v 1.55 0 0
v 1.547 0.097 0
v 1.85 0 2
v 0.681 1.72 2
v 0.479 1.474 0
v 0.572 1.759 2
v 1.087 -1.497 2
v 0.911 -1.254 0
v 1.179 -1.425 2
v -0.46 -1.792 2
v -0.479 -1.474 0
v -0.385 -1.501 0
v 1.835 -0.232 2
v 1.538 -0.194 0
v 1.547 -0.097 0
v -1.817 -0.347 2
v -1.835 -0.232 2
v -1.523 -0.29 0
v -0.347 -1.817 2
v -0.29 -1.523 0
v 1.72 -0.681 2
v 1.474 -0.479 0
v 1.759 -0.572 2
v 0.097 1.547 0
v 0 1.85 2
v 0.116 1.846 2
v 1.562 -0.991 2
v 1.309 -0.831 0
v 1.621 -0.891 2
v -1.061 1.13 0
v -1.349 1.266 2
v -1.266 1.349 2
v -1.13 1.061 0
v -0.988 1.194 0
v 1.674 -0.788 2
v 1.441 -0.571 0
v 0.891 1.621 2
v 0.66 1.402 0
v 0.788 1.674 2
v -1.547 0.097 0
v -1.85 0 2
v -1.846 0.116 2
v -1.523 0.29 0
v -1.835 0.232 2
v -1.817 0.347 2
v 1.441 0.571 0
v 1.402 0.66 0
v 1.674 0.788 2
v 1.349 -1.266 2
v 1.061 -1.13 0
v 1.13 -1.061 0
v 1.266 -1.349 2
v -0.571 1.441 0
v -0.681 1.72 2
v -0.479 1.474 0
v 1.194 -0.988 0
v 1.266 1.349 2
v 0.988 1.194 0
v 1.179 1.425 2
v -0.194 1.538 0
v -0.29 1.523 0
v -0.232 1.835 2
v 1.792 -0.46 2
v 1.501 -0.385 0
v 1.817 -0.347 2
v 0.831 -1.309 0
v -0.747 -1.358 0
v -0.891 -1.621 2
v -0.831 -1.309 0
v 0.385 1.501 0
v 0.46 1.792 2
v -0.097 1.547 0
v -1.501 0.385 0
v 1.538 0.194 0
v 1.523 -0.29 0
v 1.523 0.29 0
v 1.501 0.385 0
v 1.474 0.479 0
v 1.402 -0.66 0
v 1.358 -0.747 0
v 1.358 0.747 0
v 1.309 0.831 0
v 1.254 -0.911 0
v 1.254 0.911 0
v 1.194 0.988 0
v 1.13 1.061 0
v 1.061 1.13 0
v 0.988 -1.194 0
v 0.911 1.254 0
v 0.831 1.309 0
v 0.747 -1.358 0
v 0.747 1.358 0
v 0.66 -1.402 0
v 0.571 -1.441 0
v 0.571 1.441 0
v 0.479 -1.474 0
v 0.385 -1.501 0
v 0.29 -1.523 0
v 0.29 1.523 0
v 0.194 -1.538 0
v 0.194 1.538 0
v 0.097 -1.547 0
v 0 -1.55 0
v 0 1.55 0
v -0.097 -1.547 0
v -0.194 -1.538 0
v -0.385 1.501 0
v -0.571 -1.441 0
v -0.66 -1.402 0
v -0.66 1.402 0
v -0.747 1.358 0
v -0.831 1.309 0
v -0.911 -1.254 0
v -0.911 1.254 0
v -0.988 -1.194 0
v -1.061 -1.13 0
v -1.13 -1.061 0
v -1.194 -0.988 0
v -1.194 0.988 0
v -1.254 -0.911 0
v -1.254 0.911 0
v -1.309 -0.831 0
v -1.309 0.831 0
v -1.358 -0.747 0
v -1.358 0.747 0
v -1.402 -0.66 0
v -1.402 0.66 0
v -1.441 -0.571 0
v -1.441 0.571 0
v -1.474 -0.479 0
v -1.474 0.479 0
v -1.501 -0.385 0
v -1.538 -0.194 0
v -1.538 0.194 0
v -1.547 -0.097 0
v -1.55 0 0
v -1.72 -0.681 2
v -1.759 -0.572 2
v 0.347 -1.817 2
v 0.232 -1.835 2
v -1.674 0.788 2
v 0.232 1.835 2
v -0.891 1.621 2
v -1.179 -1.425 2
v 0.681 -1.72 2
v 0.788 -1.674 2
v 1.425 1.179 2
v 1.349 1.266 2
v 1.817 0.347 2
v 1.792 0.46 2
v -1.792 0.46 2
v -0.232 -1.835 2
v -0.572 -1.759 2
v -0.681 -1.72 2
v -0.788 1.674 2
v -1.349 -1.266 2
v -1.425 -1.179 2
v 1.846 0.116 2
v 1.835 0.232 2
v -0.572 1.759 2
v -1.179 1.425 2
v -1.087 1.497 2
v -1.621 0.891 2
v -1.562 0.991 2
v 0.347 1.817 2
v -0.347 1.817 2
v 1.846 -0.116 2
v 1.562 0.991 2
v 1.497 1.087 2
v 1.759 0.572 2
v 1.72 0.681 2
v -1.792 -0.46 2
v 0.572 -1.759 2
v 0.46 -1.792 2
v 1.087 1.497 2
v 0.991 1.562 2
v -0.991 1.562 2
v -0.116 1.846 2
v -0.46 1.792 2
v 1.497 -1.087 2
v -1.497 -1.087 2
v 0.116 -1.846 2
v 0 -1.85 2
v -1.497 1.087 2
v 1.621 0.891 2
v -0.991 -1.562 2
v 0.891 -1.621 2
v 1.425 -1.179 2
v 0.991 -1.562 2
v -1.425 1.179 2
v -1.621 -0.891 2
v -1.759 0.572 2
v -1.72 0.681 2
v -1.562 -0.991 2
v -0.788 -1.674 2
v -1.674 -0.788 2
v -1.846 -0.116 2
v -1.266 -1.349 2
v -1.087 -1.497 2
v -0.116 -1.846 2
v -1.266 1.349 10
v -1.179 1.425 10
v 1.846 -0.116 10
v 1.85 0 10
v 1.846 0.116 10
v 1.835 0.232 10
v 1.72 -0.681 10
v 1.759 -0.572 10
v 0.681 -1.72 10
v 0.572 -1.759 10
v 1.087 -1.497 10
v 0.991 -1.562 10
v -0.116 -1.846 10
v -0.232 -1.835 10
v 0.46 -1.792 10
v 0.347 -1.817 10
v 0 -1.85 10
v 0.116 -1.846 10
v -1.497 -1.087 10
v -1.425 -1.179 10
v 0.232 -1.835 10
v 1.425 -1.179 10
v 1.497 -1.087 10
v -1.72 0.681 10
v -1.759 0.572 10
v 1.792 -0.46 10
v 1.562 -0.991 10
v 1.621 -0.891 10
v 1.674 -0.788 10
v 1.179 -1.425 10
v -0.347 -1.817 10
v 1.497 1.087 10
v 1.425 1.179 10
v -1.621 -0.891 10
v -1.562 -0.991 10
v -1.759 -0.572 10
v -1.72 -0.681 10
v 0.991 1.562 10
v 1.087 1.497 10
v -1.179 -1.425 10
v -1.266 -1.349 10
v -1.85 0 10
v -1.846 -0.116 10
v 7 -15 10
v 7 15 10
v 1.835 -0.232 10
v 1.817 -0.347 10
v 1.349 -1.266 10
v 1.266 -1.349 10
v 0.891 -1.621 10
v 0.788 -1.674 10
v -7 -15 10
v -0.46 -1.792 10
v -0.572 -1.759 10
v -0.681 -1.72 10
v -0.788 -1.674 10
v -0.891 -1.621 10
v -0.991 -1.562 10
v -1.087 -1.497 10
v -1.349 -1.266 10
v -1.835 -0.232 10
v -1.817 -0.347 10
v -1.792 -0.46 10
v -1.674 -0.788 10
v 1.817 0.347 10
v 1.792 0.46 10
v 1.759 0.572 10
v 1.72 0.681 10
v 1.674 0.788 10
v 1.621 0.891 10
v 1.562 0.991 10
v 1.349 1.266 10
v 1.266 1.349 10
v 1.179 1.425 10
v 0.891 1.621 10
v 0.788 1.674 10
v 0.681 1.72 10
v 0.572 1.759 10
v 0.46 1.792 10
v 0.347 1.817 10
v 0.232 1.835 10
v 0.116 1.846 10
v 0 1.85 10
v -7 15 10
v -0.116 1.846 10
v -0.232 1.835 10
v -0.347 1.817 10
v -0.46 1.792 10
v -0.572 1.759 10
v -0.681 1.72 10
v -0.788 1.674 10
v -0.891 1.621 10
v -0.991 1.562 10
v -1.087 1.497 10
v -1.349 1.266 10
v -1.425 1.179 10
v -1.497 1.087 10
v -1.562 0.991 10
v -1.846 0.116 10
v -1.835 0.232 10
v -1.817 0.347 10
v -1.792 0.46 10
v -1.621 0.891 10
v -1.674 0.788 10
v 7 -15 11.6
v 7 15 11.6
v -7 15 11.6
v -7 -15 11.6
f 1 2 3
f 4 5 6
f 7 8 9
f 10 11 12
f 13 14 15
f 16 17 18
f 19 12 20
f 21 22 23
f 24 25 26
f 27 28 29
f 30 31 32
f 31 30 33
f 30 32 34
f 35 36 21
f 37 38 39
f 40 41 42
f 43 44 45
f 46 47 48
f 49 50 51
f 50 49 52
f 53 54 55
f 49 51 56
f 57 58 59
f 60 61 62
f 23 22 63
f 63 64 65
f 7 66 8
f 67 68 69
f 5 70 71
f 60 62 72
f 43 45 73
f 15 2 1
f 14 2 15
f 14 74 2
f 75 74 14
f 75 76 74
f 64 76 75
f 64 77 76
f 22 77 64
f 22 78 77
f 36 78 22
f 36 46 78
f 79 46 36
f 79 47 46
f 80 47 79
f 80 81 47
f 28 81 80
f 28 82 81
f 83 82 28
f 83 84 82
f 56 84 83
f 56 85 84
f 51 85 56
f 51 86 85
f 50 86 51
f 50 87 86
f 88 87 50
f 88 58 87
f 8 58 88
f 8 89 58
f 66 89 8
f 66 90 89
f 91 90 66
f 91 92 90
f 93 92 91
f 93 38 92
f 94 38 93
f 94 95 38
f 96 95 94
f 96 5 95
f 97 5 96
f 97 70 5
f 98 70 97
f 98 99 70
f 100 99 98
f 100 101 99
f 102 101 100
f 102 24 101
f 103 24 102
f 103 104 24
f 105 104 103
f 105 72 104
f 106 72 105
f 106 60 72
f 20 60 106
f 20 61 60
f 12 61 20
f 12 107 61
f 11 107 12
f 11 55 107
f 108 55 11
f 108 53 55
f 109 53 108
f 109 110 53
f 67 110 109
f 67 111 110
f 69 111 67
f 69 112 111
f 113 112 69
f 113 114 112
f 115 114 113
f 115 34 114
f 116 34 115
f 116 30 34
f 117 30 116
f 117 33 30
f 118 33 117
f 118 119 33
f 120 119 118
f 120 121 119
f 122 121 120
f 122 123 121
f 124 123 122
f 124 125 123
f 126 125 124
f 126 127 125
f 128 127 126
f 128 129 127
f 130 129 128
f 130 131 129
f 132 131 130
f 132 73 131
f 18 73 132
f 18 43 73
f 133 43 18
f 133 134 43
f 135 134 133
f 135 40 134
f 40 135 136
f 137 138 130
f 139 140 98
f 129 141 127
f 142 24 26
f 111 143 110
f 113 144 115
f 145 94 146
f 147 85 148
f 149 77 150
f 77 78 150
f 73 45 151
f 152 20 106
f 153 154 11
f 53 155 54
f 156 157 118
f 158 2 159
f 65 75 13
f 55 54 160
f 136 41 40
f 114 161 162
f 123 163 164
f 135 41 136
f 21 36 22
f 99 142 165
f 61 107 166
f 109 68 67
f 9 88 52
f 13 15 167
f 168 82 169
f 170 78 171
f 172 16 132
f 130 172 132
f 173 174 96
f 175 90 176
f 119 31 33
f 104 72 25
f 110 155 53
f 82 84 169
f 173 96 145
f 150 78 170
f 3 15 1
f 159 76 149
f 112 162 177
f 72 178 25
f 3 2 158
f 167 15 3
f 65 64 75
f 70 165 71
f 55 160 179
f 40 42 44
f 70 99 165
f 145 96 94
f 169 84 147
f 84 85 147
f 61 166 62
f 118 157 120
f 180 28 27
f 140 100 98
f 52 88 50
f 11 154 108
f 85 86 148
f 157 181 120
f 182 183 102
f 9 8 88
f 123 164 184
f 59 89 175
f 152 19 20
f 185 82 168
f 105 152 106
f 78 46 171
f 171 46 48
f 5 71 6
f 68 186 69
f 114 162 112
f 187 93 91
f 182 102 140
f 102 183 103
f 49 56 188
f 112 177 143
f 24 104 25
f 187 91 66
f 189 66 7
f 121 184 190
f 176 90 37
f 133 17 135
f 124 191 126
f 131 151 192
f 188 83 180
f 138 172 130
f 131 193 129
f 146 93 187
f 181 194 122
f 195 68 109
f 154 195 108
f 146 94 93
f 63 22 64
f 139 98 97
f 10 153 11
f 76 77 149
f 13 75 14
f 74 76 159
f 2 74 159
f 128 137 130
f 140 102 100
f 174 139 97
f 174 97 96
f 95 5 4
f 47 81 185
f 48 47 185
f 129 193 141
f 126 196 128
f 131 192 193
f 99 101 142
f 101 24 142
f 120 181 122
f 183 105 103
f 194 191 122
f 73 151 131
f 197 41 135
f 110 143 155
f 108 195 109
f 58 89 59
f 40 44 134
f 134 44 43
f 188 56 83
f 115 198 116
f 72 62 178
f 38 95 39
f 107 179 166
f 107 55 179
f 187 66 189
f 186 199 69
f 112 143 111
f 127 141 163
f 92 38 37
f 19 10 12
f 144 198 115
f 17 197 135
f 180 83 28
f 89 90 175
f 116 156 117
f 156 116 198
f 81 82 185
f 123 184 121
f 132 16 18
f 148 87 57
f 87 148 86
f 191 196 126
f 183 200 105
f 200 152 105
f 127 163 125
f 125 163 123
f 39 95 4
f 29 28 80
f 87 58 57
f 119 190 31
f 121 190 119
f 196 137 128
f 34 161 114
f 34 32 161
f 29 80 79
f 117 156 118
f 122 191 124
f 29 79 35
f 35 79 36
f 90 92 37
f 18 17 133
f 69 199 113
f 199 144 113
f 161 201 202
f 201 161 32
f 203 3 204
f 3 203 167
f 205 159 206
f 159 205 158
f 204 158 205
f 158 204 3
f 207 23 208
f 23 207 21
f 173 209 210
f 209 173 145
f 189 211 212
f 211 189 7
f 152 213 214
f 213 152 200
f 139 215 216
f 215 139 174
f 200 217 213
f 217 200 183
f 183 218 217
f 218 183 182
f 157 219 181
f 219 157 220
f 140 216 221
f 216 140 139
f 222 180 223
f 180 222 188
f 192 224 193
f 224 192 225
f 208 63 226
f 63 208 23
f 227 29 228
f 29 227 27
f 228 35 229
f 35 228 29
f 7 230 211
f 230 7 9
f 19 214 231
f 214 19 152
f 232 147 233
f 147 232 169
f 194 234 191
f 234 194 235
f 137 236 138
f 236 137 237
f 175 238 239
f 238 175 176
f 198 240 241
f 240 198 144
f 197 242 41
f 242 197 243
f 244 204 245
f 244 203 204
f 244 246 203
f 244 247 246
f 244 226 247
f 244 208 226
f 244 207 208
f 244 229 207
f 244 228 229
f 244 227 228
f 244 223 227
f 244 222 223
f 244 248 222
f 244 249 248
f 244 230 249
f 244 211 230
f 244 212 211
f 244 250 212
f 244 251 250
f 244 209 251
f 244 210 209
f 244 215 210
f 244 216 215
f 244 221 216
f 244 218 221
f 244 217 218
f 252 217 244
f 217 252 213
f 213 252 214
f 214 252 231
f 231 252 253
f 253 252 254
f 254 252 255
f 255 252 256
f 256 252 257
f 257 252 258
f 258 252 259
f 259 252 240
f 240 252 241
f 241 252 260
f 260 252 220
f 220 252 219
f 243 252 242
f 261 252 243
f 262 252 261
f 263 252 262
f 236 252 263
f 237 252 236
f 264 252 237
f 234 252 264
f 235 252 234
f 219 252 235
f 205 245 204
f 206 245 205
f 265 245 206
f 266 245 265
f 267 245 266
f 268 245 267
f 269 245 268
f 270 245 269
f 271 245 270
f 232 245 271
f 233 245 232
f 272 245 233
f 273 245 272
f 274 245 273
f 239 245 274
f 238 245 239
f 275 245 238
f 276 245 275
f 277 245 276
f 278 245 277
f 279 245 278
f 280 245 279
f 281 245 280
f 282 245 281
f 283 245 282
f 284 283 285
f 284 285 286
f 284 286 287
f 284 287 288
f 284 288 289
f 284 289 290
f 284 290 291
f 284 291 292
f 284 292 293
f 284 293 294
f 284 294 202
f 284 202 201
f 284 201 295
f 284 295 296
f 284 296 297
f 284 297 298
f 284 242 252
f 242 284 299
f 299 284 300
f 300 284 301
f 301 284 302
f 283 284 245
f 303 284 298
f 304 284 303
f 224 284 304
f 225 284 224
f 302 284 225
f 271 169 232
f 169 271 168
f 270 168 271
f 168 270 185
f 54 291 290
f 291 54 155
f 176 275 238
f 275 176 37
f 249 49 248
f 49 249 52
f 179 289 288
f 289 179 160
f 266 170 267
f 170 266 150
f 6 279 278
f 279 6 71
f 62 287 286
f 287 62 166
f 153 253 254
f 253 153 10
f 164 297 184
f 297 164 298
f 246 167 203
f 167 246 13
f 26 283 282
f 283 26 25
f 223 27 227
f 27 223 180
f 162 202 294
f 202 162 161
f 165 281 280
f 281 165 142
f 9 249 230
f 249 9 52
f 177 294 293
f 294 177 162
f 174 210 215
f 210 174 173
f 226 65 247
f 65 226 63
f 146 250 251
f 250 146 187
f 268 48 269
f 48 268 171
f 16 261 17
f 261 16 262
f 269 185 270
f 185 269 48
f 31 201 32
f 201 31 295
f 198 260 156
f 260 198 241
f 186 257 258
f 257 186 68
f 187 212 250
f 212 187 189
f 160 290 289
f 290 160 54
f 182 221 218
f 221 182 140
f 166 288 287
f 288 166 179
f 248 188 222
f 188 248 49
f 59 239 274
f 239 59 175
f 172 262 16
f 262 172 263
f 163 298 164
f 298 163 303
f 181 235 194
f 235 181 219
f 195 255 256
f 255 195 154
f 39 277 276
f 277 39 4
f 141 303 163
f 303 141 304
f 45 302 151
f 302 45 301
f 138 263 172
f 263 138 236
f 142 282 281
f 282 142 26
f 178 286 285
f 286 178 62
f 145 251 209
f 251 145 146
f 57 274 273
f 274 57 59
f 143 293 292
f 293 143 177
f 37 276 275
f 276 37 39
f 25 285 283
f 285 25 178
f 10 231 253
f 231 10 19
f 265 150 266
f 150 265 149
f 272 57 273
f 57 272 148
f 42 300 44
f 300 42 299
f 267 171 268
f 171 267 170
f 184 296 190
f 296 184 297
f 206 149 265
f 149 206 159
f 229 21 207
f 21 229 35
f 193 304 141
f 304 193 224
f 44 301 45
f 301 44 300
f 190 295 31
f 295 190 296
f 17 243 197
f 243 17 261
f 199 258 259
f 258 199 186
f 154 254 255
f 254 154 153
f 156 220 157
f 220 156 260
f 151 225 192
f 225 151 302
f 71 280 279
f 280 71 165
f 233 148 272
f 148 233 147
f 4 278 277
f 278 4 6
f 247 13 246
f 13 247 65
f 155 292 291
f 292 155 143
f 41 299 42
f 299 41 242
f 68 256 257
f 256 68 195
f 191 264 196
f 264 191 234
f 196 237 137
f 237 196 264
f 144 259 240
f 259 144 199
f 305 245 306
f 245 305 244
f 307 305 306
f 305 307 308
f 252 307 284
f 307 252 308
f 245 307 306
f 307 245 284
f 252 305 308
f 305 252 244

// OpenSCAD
// --- Parameters ---

// Cylindrical rod
hole_diameter = 3.8;
hole_depth = 10;
clearance = 0.1;
rod_diameter = hole_diameter - clearance;
rod_length = hole_depth;

// Chamfer
chamfer_height = 2;
chamfer_base_diameter = rod_diameter - 0.6;  // Slightly wider to guide well

// Rectangular stop
stop_width = 14;
stop_length = 30;
stop_height = 1.6;

module foot() {
    union() {
        chamfer();

        translate([0, 0, chamfer_height])
            rod();

        translate([-stop_width/2, -stop_length/2, rod_length])
            rectangular_stop();
    }
}

module chamfer() {
    cylinder(h = chamfer_height, d1 = chamfer_base_diameter, d2 = rod_diameter, $fn = 100);
}

module rod() {
    cylinder(h = rod_length - chamfer_height, d = rod_diameter, $fn = 100);
}

module rectangular_stop() {
    cube([stop_width, stop_length, stop_height]);
}

foot();
